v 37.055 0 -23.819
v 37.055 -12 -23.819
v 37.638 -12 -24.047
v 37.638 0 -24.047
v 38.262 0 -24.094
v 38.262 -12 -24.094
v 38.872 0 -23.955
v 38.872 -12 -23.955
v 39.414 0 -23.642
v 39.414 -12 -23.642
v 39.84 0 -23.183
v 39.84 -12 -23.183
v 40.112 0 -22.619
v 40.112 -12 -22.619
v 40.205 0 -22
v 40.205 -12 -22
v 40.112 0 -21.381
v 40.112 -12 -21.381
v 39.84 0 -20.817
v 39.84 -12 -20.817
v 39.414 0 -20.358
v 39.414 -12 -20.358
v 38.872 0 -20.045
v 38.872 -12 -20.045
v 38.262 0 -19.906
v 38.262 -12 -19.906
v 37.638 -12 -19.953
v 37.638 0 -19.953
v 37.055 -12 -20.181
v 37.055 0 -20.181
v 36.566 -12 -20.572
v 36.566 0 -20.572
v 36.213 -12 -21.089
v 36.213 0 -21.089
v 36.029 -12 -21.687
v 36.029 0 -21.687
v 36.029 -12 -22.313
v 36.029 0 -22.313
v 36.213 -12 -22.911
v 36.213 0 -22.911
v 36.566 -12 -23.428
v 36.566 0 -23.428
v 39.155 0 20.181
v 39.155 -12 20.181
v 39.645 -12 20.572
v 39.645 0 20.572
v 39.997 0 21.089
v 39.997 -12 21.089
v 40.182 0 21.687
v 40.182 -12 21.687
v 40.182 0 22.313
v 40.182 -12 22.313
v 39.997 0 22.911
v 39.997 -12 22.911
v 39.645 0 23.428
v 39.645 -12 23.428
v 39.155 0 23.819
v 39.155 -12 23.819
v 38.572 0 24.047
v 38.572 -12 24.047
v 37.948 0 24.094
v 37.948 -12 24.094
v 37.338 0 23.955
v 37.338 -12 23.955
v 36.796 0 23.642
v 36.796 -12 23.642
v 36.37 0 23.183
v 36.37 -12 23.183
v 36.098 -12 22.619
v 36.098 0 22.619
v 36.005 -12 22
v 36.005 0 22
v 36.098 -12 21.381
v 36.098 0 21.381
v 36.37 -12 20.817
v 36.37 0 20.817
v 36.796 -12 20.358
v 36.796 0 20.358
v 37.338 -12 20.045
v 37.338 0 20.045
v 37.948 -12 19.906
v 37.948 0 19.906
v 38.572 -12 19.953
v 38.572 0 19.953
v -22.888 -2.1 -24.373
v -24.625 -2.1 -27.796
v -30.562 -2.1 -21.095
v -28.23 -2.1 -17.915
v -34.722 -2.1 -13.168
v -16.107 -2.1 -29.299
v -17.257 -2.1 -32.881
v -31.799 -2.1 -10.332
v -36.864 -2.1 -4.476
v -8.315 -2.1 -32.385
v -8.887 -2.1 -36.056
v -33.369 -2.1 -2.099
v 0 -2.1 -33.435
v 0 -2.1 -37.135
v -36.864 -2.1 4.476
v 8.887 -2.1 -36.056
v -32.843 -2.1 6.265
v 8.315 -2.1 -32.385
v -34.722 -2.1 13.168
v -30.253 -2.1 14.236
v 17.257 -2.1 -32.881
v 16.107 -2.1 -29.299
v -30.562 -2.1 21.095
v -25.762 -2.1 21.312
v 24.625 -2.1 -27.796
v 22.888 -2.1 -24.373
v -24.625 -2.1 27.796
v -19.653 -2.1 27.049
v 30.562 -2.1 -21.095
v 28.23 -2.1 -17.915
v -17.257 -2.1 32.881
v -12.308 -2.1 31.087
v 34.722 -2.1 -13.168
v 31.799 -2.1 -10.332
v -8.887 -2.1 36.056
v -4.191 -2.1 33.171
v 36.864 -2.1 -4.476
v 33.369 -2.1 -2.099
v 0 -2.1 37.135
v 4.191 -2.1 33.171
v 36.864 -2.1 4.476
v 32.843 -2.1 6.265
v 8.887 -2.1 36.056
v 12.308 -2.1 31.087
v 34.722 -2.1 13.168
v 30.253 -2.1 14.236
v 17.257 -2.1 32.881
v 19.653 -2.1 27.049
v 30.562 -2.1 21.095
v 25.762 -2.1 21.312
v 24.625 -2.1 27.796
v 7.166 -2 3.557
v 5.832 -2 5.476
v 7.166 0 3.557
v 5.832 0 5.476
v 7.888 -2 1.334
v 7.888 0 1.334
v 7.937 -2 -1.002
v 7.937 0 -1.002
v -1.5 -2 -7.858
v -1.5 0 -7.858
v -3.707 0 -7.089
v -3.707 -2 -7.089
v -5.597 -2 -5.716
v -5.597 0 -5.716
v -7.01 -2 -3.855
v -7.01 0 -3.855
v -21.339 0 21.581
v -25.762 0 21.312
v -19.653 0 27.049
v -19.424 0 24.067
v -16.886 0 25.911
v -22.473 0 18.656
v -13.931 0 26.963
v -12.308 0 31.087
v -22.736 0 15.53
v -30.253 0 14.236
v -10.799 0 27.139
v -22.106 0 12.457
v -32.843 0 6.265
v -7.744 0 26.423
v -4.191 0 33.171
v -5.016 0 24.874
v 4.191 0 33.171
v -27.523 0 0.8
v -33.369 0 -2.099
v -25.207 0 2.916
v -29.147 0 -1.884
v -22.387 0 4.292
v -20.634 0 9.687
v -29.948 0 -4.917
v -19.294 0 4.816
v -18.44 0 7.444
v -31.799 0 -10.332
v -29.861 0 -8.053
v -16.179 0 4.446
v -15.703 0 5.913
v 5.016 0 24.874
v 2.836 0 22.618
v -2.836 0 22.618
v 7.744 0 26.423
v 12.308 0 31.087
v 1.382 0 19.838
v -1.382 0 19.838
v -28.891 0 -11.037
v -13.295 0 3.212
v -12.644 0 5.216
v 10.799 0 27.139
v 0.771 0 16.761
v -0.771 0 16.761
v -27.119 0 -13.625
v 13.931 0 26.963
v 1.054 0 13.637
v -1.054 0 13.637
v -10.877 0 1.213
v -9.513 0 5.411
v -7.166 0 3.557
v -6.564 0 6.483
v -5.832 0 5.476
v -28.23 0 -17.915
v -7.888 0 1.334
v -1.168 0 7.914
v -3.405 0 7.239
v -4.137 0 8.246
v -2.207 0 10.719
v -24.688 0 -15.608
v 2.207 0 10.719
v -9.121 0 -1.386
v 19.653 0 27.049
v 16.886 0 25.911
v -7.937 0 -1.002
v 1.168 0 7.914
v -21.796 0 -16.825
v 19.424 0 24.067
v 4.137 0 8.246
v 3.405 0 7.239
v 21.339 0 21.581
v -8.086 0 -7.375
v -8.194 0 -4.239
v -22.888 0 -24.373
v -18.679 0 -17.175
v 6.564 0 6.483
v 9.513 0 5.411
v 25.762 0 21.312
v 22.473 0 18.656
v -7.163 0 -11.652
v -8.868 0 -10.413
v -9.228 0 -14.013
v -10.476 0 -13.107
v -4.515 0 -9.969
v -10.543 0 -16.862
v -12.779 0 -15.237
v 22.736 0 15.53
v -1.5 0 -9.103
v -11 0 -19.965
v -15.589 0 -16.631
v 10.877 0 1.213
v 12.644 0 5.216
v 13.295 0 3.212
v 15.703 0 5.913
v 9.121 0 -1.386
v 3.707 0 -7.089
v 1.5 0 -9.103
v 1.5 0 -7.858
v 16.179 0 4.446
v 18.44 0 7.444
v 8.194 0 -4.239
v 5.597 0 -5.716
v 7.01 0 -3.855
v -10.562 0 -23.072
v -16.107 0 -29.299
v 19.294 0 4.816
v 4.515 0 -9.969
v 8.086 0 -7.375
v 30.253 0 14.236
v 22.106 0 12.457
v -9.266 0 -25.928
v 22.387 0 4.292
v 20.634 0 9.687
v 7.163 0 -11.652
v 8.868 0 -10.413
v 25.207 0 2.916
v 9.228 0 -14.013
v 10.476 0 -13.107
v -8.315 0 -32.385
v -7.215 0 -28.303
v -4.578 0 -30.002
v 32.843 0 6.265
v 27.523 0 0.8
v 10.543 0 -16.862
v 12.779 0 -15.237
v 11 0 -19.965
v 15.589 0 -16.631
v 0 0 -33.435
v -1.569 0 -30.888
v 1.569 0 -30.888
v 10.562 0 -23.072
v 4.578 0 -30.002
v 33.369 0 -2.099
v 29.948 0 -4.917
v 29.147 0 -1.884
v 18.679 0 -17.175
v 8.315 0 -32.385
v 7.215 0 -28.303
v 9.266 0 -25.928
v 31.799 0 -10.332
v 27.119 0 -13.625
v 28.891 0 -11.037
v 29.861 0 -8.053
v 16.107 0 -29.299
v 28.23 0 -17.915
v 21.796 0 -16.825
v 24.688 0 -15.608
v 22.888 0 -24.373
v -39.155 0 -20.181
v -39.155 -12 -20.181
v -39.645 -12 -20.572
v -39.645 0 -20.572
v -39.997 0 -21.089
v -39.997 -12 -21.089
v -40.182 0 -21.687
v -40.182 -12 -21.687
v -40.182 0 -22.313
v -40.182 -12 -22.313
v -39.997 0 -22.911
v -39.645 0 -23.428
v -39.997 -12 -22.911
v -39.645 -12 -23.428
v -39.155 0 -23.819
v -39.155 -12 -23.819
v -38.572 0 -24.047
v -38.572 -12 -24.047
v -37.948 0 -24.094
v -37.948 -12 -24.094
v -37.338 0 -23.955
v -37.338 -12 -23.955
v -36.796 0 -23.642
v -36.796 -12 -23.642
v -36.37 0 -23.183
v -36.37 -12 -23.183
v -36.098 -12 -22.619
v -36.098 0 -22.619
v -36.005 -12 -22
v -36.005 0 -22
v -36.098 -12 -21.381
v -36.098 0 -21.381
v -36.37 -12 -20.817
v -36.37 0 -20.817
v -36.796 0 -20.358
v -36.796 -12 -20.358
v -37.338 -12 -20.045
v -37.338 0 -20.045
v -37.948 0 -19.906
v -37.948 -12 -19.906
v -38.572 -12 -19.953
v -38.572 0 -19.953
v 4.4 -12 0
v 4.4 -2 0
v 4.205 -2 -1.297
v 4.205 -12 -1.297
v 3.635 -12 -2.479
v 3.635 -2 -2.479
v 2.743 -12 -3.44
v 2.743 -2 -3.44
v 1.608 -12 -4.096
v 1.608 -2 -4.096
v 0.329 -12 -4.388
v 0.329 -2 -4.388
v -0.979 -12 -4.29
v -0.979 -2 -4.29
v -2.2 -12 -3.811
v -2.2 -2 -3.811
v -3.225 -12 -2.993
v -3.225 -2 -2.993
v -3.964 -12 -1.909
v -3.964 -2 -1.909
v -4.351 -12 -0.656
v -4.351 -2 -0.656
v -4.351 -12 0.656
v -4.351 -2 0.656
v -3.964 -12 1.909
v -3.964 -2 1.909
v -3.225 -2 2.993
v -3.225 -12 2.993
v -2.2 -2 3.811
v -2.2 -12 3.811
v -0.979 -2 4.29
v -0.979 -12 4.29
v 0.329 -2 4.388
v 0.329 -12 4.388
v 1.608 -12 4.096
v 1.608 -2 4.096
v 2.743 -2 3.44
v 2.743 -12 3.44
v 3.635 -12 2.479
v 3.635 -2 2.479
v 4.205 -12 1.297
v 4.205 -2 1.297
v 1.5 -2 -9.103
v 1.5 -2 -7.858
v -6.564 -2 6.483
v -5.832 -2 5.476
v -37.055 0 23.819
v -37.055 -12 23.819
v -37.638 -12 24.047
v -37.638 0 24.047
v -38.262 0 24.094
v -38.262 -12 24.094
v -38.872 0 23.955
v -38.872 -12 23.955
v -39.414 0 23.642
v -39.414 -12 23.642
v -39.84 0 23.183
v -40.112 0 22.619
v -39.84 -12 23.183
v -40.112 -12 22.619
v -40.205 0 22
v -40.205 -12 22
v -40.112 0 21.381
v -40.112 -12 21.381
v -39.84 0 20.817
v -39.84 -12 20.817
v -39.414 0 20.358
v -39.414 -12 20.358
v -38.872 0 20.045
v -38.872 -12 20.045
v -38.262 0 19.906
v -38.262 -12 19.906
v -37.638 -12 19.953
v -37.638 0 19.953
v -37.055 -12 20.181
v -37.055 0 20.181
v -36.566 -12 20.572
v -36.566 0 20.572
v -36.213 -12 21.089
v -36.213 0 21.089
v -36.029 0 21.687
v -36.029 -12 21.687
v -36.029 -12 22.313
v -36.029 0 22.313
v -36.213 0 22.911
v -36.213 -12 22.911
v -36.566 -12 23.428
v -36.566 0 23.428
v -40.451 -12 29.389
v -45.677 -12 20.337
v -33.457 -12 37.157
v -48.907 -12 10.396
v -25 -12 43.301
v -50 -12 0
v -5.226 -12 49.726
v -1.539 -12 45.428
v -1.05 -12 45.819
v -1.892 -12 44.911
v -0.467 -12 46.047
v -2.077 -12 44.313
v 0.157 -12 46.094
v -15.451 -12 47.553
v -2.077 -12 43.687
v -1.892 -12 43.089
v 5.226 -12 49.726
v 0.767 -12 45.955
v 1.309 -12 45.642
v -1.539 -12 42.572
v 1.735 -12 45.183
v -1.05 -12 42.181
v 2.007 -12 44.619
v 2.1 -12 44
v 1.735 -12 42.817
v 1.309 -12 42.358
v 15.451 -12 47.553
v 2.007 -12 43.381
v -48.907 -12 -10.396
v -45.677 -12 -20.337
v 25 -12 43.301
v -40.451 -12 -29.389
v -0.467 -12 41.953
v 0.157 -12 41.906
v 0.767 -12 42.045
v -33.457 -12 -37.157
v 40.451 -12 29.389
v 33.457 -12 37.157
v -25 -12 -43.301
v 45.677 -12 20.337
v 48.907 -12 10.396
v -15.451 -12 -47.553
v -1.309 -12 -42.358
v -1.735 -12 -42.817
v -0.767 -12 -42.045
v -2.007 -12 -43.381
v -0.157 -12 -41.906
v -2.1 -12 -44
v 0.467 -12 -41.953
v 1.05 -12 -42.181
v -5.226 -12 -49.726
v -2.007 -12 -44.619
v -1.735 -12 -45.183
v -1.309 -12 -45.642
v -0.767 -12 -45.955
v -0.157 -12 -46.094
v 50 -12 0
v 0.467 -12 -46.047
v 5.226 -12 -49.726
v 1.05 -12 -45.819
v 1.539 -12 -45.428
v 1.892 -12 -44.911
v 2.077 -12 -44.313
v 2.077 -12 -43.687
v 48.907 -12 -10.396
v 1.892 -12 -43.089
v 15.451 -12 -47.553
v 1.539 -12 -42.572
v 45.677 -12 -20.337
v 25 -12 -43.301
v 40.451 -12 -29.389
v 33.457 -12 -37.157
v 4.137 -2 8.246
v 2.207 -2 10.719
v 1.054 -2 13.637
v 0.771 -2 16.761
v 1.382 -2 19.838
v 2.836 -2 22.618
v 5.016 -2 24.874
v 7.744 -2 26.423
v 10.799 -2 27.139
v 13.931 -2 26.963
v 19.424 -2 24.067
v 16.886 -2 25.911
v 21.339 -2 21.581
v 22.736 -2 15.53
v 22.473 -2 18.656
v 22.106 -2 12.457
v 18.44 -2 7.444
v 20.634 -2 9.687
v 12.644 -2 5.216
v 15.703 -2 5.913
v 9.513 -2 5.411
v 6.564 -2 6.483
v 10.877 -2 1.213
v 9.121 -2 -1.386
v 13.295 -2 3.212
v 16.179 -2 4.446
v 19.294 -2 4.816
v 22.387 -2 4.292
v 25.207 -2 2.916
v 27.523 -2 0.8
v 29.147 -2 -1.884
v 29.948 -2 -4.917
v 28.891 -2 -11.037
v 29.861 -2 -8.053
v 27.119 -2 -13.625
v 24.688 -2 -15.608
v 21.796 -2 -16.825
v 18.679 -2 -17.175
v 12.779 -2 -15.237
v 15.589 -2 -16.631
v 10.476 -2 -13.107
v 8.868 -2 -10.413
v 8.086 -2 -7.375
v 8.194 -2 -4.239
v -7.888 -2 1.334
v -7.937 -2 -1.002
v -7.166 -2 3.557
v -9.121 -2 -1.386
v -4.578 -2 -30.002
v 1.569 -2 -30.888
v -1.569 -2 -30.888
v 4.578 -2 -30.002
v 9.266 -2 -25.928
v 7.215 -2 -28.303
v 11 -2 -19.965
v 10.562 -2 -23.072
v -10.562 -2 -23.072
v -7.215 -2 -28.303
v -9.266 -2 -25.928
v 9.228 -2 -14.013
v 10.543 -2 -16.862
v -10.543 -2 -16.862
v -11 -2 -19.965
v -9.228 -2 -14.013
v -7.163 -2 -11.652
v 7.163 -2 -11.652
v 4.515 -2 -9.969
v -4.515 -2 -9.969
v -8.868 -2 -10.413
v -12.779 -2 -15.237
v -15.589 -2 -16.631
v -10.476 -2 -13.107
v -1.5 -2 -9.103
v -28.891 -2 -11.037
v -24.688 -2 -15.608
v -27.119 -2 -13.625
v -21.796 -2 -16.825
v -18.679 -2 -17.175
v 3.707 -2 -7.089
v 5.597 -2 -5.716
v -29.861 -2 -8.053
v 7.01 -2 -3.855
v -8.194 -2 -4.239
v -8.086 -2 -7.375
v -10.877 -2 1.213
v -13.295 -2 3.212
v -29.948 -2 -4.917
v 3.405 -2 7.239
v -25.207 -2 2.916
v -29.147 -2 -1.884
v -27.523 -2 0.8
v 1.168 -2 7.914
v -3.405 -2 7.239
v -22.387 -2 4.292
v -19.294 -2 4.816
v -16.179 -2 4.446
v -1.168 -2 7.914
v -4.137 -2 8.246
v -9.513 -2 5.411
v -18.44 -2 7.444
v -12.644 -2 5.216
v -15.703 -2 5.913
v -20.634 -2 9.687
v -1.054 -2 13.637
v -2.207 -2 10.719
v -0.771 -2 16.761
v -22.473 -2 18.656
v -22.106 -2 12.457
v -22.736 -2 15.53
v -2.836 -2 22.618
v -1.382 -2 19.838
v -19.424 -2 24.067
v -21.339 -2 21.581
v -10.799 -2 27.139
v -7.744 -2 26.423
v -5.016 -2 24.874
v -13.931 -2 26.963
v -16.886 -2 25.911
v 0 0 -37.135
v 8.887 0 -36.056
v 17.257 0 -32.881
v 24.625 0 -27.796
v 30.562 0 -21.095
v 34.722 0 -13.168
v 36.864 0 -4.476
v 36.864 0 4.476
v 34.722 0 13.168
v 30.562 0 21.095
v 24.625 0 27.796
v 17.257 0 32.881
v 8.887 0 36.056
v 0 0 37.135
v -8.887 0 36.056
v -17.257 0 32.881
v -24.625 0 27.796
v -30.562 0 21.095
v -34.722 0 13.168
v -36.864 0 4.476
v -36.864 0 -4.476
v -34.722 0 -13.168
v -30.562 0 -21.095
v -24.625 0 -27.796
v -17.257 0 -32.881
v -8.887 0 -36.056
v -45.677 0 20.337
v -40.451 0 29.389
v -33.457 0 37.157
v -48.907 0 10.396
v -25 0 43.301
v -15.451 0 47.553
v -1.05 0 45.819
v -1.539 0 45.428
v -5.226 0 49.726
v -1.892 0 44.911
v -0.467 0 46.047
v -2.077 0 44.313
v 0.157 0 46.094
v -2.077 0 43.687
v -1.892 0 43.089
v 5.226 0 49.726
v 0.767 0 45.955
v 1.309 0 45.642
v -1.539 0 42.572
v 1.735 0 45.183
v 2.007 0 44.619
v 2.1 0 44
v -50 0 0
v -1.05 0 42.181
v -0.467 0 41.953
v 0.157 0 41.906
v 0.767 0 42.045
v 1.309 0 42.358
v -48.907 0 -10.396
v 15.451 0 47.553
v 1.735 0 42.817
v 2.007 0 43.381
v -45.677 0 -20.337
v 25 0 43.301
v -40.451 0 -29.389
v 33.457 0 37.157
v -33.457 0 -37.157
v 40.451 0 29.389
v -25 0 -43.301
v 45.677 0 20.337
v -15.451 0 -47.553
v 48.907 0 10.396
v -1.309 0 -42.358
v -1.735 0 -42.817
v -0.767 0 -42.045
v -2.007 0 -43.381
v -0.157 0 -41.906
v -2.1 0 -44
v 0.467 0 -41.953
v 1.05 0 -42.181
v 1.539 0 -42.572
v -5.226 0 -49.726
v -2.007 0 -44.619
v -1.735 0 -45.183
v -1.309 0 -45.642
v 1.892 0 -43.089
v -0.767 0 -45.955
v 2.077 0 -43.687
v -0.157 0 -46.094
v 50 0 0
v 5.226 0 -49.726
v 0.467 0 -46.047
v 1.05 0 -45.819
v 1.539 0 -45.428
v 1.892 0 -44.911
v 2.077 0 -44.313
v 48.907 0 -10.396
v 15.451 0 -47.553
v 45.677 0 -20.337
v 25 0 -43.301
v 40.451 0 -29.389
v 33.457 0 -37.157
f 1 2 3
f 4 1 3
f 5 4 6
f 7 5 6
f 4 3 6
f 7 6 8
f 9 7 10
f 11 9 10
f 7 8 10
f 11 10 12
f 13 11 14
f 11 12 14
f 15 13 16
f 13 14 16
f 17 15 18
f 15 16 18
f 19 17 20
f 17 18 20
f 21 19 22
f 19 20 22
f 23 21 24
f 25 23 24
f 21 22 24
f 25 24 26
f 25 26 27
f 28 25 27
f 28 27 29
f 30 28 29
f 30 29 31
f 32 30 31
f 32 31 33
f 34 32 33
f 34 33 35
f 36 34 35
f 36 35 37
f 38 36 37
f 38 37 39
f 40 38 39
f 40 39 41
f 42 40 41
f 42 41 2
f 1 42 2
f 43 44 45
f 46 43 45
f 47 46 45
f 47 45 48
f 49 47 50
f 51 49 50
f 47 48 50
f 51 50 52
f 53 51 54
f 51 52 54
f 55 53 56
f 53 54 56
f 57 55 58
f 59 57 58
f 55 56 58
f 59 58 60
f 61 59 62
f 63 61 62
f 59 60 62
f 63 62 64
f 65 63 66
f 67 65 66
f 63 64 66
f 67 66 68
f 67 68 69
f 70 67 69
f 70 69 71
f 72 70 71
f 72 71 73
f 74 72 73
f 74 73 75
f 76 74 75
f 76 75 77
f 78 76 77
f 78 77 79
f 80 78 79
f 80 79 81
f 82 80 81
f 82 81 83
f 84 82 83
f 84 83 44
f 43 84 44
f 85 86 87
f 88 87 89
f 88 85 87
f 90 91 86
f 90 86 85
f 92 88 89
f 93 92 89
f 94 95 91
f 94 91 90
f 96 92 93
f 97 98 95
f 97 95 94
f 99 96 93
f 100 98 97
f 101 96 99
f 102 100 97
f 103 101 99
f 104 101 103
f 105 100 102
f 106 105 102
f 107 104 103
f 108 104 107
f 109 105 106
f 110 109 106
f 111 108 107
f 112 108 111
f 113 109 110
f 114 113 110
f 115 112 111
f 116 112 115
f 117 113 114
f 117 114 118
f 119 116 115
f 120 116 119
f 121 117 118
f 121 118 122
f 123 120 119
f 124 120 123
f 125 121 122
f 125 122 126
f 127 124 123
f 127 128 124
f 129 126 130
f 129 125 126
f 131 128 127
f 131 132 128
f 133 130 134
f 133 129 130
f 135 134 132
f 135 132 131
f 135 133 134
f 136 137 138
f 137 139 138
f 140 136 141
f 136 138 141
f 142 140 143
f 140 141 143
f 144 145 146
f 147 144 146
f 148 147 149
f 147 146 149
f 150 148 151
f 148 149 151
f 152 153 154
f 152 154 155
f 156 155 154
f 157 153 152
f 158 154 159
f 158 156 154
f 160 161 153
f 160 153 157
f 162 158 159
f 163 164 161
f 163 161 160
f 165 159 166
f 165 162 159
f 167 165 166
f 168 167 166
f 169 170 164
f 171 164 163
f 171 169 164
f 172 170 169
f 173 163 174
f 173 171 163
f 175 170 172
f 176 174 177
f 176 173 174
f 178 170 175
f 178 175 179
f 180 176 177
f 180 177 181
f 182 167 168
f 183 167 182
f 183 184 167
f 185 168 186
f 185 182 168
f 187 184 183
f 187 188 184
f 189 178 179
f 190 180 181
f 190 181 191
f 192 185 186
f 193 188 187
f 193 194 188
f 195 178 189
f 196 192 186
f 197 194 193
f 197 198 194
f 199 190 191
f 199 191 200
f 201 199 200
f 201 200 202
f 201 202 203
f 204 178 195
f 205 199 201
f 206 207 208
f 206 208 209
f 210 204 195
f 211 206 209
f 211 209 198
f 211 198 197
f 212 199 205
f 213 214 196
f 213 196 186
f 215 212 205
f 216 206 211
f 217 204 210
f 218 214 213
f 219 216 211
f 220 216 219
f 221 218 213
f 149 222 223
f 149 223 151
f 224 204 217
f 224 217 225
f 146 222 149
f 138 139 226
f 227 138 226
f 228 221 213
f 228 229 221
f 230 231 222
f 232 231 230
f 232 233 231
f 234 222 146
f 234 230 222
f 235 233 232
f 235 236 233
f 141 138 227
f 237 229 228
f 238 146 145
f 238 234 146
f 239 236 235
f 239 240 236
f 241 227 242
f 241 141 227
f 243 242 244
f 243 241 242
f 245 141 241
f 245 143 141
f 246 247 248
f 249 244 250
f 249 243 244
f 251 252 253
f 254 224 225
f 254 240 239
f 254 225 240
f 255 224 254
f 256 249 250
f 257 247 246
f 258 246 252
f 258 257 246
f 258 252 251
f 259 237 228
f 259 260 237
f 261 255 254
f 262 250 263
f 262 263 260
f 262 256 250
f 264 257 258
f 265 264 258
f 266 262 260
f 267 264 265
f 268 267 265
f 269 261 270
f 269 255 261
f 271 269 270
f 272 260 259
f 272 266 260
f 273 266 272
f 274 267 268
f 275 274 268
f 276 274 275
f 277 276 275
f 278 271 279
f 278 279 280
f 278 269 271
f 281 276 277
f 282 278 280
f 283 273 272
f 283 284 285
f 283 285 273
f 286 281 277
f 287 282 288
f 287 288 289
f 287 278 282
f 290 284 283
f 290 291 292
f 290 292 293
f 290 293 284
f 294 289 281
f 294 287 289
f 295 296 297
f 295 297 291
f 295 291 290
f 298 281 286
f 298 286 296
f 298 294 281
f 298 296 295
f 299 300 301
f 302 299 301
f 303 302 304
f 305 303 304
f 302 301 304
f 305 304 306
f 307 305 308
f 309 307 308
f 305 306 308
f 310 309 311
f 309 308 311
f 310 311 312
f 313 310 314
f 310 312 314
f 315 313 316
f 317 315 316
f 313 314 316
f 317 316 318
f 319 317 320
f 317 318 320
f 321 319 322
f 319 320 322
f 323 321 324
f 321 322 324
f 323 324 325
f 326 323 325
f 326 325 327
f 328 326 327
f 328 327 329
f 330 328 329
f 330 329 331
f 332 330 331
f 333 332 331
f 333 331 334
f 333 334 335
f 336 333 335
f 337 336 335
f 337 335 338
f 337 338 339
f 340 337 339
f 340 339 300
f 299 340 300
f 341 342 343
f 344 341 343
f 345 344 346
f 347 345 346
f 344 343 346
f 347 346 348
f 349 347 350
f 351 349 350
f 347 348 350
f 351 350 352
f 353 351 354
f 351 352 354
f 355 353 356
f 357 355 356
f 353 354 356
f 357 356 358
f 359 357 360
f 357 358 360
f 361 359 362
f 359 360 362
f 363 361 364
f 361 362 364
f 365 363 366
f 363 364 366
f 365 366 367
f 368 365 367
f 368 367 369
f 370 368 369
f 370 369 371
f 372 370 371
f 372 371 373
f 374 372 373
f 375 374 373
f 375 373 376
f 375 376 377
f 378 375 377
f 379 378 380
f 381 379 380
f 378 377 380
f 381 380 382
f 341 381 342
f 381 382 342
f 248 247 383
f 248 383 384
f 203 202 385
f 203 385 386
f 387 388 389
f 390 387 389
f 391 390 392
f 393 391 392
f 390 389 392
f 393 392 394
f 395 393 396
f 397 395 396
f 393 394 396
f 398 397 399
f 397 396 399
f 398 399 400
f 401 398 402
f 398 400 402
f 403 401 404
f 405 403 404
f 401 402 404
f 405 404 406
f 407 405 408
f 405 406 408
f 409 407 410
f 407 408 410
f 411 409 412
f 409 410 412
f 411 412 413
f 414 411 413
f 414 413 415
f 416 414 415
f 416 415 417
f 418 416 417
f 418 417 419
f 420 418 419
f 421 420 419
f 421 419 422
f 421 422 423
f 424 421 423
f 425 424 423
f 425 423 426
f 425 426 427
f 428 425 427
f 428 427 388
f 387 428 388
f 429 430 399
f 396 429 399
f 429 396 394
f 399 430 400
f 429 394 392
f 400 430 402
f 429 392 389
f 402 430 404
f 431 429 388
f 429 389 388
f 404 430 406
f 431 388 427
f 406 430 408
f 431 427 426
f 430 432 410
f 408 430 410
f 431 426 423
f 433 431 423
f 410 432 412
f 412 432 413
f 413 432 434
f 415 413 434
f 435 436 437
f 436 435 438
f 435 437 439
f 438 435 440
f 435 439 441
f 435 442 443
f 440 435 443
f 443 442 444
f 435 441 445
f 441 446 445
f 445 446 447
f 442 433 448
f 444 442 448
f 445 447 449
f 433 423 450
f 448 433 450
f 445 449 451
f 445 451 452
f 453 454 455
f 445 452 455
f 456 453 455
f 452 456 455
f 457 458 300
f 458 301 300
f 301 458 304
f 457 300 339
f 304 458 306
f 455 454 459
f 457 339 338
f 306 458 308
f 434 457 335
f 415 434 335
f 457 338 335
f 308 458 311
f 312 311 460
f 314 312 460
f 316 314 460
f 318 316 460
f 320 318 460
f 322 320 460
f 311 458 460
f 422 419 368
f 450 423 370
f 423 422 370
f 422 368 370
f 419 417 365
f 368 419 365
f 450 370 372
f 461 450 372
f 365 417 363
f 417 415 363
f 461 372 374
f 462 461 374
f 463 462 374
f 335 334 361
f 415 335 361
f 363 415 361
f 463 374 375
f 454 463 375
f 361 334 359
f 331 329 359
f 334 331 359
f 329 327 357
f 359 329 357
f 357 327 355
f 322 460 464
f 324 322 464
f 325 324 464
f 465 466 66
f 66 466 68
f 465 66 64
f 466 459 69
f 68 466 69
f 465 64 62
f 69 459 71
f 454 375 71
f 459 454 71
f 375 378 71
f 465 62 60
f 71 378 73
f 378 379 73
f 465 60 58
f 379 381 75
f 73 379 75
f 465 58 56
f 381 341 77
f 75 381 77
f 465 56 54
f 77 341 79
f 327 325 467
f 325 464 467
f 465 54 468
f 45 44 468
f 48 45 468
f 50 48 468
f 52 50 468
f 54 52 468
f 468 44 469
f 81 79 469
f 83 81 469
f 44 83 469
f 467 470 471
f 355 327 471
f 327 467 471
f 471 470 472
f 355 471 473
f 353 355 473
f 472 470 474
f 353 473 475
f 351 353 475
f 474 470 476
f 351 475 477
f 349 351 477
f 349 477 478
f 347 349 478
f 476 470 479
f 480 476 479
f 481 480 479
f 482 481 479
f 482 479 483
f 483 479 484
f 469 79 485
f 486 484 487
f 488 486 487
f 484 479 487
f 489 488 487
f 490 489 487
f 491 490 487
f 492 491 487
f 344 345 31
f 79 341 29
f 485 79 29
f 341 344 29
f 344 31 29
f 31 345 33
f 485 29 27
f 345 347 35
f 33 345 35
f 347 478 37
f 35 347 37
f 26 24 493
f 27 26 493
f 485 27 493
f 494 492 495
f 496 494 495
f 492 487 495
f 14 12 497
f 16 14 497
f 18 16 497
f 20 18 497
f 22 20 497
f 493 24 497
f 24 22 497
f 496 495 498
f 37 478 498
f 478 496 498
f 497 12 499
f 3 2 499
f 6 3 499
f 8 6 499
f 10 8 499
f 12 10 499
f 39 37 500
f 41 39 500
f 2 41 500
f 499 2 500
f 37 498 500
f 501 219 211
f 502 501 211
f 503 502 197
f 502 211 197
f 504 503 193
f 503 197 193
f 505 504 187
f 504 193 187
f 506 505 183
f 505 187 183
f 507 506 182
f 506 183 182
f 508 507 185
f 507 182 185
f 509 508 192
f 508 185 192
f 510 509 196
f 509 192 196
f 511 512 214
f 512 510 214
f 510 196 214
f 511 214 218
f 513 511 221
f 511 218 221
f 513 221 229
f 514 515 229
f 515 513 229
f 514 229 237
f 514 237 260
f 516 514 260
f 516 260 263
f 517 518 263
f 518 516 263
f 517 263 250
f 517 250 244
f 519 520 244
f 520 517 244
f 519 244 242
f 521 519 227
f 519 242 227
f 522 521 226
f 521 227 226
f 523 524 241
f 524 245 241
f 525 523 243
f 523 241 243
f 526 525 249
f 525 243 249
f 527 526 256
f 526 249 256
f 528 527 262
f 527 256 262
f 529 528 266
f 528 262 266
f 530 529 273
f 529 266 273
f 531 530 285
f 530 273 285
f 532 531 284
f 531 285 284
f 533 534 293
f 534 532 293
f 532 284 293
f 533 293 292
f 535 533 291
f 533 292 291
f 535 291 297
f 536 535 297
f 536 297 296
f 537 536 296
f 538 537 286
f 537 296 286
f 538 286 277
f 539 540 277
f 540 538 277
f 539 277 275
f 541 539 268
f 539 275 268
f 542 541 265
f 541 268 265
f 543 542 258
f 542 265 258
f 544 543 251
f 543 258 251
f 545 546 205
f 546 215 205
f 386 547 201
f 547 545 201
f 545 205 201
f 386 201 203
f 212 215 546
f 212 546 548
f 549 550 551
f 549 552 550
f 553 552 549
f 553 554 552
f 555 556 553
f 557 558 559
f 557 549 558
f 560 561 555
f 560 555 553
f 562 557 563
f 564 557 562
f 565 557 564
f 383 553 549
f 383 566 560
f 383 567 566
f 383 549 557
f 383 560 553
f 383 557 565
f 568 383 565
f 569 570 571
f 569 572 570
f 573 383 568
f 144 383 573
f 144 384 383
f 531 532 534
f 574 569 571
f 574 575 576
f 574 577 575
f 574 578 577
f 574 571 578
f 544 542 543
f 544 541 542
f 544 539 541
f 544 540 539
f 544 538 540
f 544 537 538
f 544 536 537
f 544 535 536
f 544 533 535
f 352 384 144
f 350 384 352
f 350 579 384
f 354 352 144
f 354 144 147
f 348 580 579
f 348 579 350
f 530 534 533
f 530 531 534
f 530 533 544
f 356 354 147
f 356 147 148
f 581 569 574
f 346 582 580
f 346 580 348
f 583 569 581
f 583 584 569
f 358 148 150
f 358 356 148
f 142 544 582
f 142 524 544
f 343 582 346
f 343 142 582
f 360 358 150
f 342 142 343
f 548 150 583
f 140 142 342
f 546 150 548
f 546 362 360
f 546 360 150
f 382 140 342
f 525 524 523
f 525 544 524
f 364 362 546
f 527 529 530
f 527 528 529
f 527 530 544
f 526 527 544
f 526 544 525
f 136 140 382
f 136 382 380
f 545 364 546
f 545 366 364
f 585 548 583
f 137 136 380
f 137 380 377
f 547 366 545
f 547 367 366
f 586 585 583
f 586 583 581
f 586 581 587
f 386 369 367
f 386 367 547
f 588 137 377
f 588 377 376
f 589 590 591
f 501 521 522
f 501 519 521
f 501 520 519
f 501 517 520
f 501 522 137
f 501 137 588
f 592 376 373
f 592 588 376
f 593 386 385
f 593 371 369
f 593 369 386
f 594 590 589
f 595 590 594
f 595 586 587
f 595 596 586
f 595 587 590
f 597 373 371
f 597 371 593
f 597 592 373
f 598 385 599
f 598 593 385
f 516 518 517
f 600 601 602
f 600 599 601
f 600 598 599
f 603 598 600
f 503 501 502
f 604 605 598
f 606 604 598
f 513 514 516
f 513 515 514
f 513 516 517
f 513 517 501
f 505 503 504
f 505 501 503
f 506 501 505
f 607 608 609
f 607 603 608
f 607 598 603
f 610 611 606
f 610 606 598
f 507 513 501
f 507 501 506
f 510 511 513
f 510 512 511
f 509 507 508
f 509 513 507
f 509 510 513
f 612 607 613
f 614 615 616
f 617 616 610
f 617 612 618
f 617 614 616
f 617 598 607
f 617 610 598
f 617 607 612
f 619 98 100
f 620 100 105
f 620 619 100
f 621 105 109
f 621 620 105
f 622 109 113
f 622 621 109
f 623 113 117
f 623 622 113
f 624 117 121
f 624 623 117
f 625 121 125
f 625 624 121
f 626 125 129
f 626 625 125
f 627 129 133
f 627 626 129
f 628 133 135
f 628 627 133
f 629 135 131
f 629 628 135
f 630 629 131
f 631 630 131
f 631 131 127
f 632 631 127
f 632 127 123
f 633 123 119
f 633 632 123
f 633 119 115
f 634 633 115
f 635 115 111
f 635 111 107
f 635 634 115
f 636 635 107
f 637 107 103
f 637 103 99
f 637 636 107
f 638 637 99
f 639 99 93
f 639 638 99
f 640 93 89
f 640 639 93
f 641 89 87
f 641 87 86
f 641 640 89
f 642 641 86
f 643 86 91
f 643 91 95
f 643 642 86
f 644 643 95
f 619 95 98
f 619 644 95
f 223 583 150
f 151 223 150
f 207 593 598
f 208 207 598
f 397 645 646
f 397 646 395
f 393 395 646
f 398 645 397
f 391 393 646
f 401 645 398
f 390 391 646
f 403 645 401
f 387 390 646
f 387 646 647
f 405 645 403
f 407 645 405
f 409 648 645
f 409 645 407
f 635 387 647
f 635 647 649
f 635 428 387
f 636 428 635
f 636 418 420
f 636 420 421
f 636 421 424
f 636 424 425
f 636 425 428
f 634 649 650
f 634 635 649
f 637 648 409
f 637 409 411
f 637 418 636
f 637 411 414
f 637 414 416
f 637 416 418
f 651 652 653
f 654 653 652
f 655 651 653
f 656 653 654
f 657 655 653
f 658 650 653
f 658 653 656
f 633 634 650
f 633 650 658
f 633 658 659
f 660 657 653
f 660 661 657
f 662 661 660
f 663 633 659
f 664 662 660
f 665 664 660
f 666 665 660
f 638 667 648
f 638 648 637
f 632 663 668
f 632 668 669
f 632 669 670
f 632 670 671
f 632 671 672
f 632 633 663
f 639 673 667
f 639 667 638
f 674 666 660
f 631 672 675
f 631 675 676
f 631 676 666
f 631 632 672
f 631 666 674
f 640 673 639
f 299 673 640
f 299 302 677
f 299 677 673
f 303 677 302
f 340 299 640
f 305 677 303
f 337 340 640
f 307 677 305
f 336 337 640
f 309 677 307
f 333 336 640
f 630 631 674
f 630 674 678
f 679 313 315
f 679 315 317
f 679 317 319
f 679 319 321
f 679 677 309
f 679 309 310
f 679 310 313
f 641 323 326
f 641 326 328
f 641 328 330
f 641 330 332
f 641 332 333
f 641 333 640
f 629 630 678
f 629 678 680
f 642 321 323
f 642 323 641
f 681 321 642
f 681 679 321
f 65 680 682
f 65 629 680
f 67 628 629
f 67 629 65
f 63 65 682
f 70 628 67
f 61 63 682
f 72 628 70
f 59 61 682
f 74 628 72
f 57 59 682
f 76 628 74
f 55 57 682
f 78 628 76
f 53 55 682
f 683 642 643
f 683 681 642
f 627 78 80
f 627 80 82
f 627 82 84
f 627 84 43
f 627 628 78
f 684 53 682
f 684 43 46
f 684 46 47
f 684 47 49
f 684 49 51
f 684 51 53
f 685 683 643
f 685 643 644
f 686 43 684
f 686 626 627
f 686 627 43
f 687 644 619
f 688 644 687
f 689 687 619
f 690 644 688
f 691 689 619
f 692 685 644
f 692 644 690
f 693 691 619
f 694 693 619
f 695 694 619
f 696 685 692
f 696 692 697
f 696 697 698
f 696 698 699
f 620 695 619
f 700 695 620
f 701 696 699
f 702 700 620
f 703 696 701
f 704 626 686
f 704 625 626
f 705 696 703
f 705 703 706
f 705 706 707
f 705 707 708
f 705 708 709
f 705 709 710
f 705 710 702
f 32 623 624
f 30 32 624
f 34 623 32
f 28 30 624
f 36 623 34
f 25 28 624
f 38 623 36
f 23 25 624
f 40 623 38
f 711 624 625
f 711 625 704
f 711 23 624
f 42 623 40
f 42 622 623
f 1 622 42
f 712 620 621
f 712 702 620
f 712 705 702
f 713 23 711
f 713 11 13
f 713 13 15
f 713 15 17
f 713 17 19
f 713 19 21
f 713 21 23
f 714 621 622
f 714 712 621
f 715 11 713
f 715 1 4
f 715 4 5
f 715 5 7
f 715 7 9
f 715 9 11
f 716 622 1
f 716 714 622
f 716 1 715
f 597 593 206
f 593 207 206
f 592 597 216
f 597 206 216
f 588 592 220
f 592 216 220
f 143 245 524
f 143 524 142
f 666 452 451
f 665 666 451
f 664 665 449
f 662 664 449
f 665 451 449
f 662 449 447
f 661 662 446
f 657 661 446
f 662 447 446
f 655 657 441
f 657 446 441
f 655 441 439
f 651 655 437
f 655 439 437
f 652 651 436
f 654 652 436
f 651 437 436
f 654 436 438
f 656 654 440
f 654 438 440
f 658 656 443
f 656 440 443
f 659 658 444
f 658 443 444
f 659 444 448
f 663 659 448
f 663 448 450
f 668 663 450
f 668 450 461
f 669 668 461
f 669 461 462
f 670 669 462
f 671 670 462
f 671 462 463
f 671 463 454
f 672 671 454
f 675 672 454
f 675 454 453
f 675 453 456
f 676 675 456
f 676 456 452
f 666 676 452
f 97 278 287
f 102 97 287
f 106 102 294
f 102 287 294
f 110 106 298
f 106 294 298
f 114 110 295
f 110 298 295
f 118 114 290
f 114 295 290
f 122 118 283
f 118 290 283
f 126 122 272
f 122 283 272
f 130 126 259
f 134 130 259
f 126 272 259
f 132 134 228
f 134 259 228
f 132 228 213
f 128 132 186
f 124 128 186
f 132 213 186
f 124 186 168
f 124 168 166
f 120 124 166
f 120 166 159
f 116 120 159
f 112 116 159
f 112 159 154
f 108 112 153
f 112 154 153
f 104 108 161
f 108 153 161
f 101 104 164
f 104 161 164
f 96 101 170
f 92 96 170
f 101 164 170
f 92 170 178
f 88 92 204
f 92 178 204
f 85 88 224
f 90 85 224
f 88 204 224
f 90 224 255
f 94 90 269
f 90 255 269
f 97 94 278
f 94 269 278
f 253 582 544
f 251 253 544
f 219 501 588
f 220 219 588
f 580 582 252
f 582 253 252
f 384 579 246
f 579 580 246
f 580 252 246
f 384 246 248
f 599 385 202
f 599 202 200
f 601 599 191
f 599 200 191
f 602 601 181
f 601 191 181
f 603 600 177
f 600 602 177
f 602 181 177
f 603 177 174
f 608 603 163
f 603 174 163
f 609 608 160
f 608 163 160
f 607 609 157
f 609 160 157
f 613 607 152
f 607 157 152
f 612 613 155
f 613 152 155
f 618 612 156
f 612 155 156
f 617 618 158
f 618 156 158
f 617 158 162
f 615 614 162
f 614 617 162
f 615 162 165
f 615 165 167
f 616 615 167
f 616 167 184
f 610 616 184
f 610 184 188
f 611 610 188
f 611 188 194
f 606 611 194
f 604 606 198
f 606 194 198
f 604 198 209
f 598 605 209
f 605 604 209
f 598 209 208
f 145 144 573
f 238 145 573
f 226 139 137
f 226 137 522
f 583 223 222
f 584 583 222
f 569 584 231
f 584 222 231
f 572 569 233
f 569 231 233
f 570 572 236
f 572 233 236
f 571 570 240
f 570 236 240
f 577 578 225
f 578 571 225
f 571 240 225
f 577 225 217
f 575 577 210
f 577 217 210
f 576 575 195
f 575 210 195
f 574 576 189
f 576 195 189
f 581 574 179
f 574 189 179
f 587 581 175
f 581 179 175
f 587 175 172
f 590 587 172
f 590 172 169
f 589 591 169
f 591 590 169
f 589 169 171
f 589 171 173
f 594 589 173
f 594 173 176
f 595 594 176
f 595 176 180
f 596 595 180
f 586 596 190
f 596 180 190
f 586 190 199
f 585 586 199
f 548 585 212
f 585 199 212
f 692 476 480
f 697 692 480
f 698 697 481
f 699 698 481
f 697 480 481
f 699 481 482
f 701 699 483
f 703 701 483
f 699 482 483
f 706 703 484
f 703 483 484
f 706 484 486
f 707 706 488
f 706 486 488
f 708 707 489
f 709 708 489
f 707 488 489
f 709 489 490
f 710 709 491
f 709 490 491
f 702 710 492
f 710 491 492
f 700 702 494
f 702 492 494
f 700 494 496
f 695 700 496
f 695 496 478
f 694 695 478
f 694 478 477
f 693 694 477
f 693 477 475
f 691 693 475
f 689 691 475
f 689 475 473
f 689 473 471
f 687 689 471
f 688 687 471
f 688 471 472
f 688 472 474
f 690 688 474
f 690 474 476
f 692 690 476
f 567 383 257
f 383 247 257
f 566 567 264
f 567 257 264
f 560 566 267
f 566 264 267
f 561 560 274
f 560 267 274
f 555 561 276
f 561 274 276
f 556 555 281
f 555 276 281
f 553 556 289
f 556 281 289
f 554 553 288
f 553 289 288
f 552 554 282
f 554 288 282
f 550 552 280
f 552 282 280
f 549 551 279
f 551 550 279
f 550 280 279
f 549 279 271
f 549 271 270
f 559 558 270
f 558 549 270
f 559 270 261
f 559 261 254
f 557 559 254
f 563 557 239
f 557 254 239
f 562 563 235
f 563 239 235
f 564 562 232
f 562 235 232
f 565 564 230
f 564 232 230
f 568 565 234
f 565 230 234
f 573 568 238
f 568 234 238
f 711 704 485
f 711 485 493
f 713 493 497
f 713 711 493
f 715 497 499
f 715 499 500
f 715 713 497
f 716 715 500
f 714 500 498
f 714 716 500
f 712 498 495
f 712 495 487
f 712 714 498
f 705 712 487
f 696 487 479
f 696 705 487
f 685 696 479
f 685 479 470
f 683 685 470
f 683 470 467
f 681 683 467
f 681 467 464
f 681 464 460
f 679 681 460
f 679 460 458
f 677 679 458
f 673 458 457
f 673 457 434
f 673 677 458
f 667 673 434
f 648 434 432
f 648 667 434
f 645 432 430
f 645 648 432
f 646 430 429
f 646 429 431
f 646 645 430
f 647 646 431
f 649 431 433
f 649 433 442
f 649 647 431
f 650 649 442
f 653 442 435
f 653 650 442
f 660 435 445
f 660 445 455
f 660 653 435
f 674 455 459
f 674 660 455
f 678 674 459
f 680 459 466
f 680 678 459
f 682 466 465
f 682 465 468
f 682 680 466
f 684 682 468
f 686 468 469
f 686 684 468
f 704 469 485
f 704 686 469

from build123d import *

# Parameters (mm, degrees)
CROQUIS2_R              = 50
SALIENTE_EXTRUIR1_DEPTH = 12
CROQUIS2_3_R            = 11
CORTAR_EXTRUIR1_DEPTH   = 2
CROQUIS2_6_R            = 8
CORTAR_EXTRUIR4_DEPTH   = 2
TALADRO_ROSCADO_G1_81_D = 8.8
CORTAR_EXTRUIR3_DEPTH   = 2
MATRIZC1_COUNT          = 5
CROQUIS7_W              = 3.7
CROQUIS7_H              = 4.2
TALADRO_ROSCADO_M51_D   = 4.2
MATRIZC2_COUNT          = 6


with BuildPart() as part:
    # Croquis2 → Saliente-Extruir1 (new body)
    with BuildSketch(Plane(origin=(0, 0, 0), x_dir=(1, 0, 0), z_dir=(0, 1, 0))):
        Circle(CROQUIS2_R)
    extrude(amount=-SALIENTE_EXTRUIR1_DEPTH)

    # Croquis2<3> → Cortar-Extruir1 (cut)
    with BuildSketch(Plane(origin=(0, 0, 0), x_dir=(1, 0, 0), z_dir=(0, 1, 0))):
        with Locations((0, 20)):
            Circle(CROQUIS2_3_R)
    cortar_extruir1 = extrude(amount=-CORTAR_EXTRUIR1_DEPTH, mode=Mode.SUBTRACT)

    # Croquis2<6> → Cortar-Extruir4 (cut)
    with BuildSketch(Plane(origin=(0, 0, 0), x_dir=(1, 0, 0), z_dir=(0, 1, 0))):
        Circle(CROQUIS2_6_R)
    extrude(amount=-CORTAR_EXTRUIR4_DEPTH, mode=Mode.SUBTRACT)

    # Taladro roscado G1/81 (through all)
    with Locations(Plane(origin=(0, -12, 0), x_dir=(-1, 0, 0), z_dir=(0, -1, 0))):
        with Locations((0, 0)):
            Hole(TALADRO_ROSCADO_G1_81_D / 2)

    # Croquis6 → Cortar-Extruir3 (cut)
    with BuildSketch(Plane(origin=(0, 0, 0), x_dir=(1, 0, 0), z_dir=(0, 1, 0))):
        with BuildLine():
            Line((1.5, 20), (1.5, 0))
            ThreePointArc((1.5, 0), (0, -1.5), (-1.5, 0))
            Line((-1.5, 0), (-1.5, 20))
            ThreePointArc((-1.5, 20), (0, 21.5), (1.5, 20))
        make_face()
    cortar_extruir3 = extrude(amount=-CORTAR_EXTRUIR3_DEPTH, mode=Mode.SUBTRACT)

    # MatrizC1: Cortar-Extruir1, Cortar-Extruir3 ×5 about axis
    matrizc1_axis = Axis((0, 0, 0), (0, 1, 0))
    for i in range(1, MATRIZC1_COUNT):
        add(cortar_extruir1.rotate(matrizc1_axis, i * 360 / MATRIZC1_COUNT), mode=Mode.SUBTRACT)
        add(cortar_extruir3.rotate(matrizc1_axis, i * 360 / MATRIZC1_COUNT), mode=Mode.SUBTRACT)

    # Croquis7 → Cortar-Revolución1 (revolve, cut)
    with BuildSketch(Plane(origin=(0, 0, 0), x_dir=(0, 0, -1), z_dir=(1, 0, 0))):
        with Locations((35.285, 0)):
            Rectangle(CROQUIS7_W, CROQUIS7_H)
    revolve(axis=Axis((0, 0, 0), (0, -1, 0)), mode=Mode.SUBTRACT)

    # Taladro roscado M51 (through all)
    with Locations(Plane(origin=(0, 0, 0), x_dir=(1, 0, 0), z_dir=(0, 1, 0))):
        with Locations((0, 44)):
            taladro_roscado_m51 = Hole(TALADRO_ROSCADO_M51_D / 2)

    # MatrizC2: Taladro roscado M51 ×6 about axis
    matrizc2_axis = Axis((0, 0, 0), (0, 1, 0))
    for i in range(1, MATRIZC2_COUNT):
        add(taladro_roscado_m51.rotate(matrizc2_axis, i * 360 / MATRIZC2_COUNT), mode=Mode.SUBTRACT)


solid = part.part
